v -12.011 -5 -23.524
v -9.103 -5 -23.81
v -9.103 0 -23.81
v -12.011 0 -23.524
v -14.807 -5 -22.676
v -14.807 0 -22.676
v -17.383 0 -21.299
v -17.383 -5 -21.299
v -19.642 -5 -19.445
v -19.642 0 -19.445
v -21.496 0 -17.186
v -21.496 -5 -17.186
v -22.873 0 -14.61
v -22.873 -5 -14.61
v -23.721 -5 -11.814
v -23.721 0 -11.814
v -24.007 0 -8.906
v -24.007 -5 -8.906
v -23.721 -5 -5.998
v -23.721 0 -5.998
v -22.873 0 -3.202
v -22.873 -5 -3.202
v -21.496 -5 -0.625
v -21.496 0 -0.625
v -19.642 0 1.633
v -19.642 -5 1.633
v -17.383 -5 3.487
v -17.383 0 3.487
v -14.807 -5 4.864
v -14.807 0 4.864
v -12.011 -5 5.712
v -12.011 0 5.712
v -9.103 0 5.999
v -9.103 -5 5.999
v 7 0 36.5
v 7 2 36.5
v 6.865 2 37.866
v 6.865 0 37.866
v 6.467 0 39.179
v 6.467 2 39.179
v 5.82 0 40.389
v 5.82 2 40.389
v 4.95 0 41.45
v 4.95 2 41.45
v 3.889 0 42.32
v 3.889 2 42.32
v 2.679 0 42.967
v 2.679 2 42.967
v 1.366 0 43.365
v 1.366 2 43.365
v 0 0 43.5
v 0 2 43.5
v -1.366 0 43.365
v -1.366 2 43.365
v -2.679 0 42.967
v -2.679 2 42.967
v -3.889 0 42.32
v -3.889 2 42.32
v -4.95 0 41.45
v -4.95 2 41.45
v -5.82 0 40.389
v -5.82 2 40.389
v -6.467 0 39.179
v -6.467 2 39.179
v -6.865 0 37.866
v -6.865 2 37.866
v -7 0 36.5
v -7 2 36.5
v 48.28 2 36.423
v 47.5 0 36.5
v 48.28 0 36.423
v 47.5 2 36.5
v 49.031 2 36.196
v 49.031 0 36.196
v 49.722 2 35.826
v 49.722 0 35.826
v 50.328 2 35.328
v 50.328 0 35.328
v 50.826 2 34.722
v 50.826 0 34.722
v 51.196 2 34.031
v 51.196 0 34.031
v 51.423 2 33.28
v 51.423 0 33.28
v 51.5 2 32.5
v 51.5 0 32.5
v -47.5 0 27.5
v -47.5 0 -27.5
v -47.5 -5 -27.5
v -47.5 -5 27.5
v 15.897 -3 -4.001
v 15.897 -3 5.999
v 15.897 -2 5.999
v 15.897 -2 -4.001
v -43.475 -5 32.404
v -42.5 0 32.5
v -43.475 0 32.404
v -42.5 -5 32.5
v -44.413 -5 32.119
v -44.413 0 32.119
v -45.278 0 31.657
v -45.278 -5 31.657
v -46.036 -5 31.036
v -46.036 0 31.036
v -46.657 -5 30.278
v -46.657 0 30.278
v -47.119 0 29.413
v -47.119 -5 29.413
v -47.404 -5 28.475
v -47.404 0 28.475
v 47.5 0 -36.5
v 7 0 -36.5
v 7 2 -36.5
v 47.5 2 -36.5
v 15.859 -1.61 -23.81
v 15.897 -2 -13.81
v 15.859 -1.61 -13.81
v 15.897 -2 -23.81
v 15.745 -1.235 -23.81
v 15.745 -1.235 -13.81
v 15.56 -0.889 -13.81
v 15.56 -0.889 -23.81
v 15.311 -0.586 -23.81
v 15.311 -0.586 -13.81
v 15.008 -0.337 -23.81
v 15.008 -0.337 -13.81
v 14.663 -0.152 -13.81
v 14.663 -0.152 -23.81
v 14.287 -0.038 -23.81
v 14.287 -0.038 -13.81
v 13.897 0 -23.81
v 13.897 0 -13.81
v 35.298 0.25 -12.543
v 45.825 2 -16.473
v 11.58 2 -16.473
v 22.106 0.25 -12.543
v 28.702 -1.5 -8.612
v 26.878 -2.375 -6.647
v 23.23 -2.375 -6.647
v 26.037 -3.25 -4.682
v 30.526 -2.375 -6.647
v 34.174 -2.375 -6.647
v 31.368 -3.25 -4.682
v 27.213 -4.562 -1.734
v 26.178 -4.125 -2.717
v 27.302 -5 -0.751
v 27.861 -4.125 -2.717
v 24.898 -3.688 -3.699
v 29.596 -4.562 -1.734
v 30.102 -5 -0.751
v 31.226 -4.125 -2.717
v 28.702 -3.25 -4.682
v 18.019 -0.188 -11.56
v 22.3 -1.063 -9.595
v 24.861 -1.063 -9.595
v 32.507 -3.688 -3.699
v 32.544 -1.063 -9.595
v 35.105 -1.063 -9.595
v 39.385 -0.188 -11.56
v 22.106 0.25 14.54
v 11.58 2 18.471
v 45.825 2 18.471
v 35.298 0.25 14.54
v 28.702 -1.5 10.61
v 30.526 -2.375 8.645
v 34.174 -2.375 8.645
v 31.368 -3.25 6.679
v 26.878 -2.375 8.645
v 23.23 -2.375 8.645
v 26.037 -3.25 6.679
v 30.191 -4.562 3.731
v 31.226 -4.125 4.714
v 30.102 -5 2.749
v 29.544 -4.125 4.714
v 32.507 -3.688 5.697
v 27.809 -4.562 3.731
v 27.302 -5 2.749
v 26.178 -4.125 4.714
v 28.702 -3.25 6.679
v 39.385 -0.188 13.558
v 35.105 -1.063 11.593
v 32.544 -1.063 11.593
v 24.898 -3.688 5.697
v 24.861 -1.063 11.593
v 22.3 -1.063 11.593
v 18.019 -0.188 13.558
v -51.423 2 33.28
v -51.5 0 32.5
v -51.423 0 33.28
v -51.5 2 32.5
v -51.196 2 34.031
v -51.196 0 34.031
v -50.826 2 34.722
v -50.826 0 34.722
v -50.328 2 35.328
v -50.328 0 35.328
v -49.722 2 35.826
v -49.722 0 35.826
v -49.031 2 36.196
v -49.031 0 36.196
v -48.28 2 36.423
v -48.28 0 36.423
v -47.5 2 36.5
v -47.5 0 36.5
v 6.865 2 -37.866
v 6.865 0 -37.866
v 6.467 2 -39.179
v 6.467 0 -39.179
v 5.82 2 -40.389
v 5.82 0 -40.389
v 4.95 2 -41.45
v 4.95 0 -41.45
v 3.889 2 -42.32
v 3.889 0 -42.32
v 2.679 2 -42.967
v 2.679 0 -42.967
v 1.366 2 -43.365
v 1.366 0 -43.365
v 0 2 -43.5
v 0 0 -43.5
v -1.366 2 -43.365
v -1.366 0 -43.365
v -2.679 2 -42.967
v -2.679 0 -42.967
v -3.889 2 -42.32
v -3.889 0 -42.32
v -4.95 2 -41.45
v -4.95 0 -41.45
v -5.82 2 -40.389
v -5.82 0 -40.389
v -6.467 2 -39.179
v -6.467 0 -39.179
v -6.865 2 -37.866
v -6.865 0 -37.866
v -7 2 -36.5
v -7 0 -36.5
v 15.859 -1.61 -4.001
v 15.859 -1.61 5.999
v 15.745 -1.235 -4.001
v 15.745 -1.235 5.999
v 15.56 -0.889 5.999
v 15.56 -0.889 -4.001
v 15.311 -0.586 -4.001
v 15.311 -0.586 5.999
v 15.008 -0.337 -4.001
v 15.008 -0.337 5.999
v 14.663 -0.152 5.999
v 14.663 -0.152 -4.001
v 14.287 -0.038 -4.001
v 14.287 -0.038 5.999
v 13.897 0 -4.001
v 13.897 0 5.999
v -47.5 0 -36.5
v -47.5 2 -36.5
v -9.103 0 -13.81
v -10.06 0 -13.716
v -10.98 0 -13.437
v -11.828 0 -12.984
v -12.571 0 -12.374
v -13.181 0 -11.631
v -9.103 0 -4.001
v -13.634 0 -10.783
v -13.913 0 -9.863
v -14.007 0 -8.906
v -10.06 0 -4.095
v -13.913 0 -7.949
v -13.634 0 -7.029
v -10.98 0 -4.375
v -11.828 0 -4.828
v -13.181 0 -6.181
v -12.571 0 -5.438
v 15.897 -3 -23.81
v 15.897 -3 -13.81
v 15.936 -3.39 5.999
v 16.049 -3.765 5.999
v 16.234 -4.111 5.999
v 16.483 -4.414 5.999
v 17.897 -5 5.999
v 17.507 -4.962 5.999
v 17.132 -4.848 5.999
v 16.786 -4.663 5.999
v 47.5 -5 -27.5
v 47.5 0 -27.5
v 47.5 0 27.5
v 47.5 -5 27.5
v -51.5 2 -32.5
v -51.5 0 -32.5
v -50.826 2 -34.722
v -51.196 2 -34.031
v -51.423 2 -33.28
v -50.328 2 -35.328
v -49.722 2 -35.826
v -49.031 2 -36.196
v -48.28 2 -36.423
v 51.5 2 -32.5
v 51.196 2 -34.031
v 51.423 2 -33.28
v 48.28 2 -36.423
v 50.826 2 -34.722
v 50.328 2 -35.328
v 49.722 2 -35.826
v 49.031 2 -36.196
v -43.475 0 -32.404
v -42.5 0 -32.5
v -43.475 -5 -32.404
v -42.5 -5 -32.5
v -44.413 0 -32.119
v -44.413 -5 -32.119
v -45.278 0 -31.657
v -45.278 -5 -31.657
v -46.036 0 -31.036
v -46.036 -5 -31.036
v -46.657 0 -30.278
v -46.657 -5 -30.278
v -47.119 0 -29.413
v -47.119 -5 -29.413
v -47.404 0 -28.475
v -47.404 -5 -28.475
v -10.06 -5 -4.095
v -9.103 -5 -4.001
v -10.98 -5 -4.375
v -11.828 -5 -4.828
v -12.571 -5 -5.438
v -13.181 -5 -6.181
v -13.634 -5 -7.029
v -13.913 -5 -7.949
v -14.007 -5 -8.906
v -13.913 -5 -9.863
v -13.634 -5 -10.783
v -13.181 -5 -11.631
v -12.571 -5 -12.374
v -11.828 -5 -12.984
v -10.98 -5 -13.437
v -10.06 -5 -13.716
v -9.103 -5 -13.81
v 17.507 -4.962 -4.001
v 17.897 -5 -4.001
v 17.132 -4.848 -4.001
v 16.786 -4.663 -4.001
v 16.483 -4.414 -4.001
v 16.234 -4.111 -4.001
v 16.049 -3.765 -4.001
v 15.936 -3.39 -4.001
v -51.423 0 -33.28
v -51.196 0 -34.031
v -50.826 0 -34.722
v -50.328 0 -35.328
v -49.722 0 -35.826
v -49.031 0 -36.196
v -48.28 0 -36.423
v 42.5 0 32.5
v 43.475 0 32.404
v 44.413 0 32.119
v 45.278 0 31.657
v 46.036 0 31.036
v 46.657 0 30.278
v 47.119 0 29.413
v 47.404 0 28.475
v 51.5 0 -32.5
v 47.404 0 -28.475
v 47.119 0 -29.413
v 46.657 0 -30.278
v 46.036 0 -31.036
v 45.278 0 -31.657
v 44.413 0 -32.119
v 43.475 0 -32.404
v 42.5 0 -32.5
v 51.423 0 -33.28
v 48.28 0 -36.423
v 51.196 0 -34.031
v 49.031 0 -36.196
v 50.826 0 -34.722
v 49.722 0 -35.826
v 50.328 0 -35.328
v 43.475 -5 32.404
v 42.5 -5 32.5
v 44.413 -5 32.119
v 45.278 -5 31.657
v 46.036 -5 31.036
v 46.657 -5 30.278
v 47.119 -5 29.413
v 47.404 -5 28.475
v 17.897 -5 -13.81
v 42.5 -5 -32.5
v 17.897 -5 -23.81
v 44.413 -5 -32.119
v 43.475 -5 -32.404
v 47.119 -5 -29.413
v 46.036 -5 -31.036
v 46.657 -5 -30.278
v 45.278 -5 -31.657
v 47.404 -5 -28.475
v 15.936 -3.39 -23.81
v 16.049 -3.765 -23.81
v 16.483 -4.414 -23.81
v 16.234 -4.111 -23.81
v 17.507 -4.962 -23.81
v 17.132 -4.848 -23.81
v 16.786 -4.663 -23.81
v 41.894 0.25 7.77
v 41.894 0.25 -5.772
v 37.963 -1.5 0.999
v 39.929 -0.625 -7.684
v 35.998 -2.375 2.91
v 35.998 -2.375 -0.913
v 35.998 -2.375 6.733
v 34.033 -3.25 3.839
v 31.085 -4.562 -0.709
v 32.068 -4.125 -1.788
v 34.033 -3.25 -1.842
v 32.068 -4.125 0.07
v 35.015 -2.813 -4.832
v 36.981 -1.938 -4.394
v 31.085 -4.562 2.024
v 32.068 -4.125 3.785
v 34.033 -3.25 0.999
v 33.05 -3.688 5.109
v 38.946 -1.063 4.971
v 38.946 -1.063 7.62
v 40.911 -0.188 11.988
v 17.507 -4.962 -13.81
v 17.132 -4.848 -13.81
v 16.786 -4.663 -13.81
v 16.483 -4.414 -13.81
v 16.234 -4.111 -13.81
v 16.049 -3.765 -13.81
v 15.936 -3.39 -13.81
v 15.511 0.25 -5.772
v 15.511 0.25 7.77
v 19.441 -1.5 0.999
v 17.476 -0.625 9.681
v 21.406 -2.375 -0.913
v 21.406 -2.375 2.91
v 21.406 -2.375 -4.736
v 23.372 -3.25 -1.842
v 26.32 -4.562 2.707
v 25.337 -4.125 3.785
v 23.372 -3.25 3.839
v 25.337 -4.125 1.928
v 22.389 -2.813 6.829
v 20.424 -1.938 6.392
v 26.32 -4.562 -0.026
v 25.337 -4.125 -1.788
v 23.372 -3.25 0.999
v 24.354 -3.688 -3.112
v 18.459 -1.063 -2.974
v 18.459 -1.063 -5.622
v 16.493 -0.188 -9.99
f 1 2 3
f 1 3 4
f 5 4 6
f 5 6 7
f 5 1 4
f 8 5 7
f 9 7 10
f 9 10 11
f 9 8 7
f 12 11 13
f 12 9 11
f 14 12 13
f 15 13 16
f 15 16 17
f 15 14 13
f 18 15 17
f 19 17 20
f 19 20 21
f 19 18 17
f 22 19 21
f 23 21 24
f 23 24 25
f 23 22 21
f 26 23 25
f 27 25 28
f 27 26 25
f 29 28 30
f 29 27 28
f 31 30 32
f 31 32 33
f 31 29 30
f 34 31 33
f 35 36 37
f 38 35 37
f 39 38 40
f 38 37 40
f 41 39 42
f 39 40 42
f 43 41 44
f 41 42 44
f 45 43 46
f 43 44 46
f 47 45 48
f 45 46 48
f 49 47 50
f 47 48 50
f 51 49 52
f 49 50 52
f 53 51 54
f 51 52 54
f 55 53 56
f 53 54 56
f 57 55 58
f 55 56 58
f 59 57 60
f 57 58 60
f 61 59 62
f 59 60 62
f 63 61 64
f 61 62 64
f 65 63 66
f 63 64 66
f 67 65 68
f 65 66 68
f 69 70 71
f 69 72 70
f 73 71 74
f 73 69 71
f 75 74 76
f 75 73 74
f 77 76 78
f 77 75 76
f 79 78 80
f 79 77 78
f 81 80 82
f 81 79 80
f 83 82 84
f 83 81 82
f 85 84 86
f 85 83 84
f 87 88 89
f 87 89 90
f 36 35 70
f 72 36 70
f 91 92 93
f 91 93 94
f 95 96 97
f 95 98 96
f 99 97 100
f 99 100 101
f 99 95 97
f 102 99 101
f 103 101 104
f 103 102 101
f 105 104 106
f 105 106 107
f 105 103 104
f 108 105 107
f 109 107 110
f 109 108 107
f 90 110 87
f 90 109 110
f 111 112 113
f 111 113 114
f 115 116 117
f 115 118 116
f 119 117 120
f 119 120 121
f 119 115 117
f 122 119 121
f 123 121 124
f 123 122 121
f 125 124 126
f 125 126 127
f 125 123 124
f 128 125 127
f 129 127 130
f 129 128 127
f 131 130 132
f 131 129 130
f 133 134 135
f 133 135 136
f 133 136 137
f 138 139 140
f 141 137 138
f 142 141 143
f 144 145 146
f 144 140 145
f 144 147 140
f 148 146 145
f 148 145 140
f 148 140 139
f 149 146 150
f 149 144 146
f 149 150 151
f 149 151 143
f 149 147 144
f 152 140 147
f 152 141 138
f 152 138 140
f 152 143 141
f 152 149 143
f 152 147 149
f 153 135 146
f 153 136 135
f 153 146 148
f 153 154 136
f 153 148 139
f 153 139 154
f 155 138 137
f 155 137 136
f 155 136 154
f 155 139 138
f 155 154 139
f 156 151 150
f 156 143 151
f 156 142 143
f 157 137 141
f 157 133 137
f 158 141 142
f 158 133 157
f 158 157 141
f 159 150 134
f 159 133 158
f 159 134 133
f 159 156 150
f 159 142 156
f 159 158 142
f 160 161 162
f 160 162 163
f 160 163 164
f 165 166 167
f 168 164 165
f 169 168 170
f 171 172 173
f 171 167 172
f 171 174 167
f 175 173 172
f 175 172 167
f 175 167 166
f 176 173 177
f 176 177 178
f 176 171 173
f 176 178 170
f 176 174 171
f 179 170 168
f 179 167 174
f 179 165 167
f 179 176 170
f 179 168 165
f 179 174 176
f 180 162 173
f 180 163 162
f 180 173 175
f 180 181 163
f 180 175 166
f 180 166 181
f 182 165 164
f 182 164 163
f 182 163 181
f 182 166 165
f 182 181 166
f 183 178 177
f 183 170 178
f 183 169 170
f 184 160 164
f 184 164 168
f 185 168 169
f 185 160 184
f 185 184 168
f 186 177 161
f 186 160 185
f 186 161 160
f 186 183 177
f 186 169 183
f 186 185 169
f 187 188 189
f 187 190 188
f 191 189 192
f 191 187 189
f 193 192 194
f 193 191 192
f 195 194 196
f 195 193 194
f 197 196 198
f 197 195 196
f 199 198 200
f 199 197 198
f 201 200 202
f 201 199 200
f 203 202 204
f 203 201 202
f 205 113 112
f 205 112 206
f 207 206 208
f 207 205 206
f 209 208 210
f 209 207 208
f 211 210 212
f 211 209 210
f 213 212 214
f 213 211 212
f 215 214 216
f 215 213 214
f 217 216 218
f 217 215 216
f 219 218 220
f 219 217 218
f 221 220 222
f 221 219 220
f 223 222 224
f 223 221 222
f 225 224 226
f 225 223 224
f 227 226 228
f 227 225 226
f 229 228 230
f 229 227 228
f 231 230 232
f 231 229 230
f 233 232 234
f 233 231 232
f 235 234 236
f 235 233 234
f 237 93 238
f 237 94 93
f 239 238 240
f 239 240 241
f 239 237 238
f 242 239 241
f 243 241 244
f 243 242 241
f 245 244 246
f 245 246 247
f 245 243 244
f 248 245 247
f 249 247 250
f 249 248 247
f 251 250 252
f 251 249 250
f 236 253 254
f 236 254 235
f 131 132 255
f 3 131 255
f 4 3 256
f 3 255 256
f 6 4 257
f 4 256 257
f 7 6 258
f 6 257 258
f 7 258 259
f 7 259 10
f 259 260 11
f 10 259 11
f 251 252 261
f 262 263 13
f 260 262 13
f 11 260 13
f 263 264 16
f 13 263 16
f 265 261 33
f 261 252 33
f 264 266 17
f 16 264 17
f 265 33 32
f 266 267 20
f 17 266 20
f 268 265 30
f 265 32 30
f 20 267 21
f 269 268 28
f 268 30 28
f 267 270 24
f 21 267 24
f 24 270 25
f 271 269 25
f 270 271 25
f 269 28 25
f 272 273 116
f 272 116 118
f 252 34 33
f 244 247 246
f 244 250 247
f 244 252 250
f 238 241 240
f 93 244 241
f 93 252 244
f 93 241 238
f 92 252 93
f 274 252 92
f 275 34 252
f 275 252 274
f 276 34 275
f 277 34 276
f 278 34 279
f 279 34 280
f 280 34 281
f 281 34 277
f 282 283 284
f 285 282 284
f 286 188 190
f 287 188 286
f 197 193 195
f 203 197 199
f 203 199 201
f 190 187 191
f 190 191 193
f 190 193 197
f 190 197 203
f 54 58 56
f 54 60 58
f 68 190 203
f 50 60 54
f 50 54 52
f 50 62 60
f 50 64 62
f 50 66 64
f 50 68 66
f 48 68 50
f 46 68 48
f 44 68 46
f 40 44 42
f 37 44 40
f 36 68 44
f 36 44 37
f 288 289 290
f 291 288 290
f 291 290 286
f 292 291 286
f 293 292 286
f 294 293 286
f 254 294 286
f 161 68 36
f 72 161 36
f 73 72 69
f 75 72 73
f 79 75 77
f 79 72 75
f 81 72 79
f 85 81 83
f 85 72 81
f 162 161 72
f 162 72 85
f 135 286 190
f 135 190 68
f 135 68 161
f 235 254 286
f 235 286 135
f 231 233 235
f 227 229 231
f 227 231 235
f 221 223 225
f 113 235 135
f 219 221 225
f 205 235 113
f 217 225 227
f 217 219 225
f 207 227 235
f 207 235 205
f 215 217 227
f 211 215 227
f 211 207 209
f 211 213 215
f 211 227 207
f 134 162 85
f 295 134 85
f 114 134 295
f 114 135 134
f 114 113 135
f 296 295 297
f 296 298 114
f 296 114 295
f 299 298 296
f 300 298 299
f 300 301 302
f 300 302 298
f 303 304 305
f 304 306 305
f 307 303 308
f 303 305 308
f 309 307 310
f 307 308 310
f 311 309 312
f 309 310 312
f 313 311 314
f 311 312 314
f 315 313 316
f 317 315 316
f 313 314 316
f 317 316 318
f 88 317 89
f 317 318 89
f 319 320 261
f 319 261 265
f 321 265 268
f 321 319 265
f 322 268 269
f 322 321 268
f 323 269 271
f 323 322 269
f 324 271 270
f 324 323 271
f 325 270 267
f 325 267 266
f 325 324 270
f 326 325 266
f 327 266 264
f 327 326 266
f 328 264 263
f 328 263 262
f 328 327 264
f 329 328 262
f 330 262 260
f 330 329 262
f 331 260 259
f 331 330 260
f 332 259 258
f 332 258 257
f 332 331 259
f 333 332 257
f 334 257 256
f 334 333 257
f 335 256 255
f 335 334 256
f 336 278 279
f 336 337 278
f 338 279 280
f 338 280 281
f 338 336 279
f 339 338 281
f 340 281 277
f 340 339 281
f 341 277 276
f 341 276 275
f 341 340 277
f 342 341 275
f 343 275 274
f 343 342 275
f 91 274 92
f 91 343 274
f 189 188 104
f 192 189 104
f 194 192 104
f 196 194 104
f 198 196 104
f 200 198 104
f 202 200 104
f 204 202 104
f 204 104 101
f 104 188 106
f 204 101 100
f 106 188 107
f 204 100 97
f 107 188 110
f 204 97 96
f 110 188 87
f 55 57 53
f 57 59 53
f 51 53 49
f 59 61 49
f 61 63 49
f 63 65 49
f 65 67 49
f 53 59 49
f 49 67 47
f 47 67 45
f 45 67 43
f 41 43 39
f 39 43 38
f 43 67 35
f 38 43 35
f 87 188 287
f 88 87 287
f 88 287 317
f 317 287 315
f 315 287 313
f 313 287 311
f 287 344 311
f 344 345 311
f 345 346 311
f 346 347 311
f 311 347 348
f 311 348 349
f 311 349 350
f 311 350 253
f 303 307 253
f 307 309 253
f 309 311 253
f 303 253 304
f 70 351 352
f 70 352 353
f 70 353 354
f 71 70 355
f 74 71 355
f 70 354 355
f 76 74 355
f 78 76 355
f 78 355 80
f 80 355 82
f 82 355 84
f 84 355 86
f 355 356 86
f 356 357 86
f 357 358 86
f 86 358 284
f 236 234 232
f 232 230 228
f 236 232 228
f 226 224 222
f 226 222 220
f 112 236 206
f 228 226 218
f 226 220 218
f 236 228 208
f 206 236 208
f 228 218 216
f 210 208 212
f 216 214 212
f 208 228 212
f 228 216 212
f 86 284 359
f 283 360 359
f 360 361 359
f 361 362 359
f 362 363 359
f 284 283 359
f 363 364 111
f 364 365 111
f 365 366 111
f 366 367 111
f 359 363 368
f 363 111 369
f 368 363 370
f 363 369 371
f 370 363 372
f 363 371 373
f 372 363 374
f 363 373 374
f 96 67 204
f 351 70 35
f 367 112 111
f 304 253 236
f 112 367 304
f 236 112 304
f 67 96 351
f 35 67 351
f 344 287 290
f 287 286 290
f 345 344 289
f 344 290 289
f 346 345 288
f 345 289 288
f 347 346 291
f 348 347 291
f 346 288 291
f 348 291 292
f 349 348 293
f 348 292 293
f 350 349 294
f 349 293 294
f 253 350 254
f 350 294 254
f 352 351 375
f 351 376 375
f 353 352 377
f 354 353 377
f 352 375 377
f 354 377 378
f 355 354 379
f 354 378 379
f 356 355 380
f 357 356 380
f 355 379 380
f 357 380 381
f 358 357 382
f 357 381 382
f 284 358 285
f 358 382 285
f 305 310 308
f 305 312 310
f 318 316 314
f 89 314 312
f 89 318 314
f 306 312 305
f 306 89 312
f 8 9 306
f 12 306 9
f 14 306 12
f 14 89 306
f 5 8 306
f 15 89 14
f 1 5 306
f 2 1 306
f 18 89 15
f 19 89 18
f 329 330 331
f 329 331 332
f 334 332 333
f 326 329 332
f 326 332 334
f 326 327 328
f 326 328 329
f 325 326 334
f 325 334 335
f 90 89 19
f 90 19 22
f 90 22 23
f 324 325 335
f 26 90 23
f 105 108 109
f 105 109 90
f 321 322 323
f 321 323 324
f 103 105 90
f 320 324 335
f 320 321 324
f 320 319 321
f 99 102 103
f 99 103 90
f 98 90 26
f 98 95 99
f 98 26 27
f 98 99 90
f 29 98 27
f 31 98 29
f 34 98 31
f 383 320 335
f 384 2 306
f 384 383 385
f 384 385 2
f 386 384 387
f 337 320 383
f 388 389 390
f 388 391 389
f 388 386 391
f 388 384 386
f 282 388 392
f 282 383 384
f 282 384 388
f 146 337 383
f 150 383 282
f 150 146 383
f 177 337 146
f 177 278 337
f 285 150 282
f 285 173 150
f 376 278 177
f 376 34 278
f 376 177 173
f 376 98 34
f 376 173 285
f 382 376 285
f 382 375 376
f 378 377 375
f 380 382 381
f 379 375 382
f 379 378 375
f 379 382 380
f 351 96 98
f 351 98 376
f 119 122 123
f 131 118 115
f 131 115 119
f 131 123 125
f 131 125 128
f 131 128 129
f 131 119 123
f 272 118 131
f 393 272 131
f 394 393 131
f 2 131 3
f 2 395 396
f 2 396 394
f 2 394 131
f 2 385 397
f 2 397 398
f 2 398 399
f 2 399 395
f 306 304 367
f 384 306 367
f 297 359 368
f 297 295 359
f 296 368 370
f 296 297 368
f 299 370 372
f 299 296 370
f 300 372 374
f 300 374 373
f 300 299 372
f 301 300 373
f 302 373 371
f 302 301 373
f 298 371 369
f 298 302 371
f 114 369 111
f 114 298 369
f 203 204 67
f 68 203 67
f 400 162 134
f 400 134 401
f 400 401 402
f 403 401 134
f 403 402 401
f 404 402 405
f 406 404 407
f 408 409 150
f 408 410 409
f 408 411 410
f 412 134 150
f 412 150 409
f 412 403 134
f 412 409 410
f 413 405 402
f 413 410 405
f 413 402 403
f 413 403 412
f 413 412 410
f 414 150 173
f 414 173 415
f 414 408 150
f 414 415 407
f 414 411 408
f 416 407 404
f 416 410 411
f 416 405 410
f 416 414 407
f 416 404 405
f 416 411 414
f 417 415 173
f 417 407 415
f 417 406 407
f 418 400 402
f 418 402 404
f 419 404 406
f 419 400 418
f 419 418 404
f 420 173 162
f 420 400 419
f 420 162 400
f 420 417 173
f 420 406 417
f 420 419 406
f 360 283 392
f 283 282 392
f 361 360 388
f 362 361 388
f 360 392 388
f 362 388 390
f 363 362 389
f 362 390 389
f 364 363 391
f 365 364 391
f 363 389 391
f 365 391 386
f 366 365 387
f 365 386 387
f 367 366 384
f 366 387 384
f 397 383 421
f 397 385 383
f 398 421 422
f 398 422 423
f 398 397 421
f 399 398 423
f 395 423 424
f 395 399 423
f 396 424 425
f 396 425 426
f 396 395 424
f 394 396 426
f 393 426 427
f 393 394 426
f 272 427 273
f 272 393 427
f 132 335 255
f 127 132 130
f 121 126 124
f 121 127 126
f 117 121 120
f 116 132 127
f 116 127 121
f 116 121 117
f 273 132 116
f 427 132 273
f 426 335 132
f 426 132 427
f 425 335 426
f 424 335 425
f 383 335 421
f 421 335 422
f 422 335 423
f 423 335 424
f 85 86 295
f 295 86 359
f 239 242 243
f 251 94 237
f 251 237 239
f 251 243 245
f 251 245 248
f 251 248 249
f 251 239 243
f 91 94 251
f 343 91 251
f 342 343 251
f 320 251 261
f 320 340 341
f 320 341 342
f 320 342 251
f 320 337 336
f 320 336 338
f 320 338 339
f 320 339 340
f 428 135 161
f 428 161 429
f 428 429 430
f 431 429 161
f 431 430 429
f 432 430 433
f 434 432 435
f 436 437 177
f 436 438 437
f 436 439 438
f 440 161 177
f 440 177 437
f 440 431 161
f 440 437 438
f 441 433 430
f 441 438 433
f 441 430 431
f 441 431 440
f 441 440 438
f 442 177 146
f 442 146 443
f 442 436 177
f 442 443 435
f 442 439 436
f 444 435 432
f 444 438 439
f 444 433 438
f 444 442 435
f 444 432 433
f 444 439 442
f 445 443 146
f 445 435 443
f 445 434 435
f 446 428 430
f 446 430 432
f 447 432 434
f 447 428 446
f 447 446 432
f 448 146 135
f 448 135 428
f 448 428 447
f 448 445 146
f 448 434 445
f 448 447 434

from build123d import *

# Parameters (mm, degrees)
SKETCH1_W           = 103
SKETCH1_H           = 73
BOSS_EXTRUDE1_DEPTH = 2
SKETCH2_W           = 95
SKETCH2_H           = 65
BOSS_EXTRUDE2_DEPTH = 5
BOSS_EXTRUDE3_DEPTH = 2
SKETCH12_W          = 2.8
SKETCH12_H          = 3.5
CUT_EXTRUDE3_DEPTH  = 7
CUT_EXTRUDE3_TAPER  = -66
FILLET4_R           = 4
CUT_EXTRUDE5_DEPTH  = 5
FILLET5_R           = 2
FILLET6_R           = 5


with BuildPart() as part:
    # Sketch1 → Boss-Extrude1 (new body)
    with BuildSketch(Plane(origin=(0, 0, 0), x_dir=(1, 0, 0), z_dir=(0, 1, 0))):
        Rectangle(SKETCH1_W, SKETCH1_H)
    extrude(amount=BOSS_EXTRUDE1_DEPTH)

    # Sketch2 → Boss-Extrude2 (add)
    with BuildSketch(Plane.XZ):
        Rectangle(SKETCH2_W, SKETCH2_H)
    extrude(amount=BOSS_EXTRUDE2_DEPTH)

    # Sketch3 → Boss-Extrude3 (add)
    with BuildSketch(Plane(origin=(0, 2, 0), x_dir=(1, 0, 0), z_dir=(0, 1, 0))):
        with BuildLine():
            Line((-7, -36.5), (7, -36.5))
            ThreePointArc((7, -36.5), (0, -43.5), (-7, -36.5))
        make_face()
    boss_extrude3 = extrude(amount=-BOSS_EXTRUDE3_DEPTH)

    # Mirror1: Boss-Extrude3 across plane
    add(boss_extrude3.mirror(Plane.XY))

    # Sketch12 → Cut-Extrude3 (cut)
    with BuildSketch(Plane.XZ.offset(5)):
        with Locations((28.702273545, 0.998760933)):
            Rectangle(SKETCH12_W, SKETCH12_H)
    extrude(amount=-CUT_EXTRUDE3_DEPTH, taper=CUT_EXTRUDE3_TAPER, mode=Mode.SUBTRACT)

    # Fillet4
    fillet4_edges = [part.edges().sort_by_distance(p)[0] for p in [
        (51.5, 1, 36.5),
        (-51.5, 1, 36.5),
        (-51.5, 1, -36.5),
        (51.5, 1, -36.5),
    ]]
    fillet(fillet4_edges, radius=FILLET4_R)

    # Sketch13 → Cut-Extrude5 (cut)
    with BuildSketch(Plane.XZ.offset(5)):
        with BuildLine():
            ThreePointArc((-9.102862796, -4.001239067), (-14.007432374, -8.905808645), (-9.102862796, -13.810378223))
            Line((-9.102862796, -13.810378223), (15.897137204, -13.810378223))
            Line((15.897137204, -13.810378223), (15.897137204, -23.810378223))
            Line((15.897137204, -23.810378223), (-9.102862796, -23.810378223))
            ThreePointArc((-9.102862796, -23.810378223), (-24.007432374, -8.905808645), (-9.102862796, 5.998760933))
            Line((-9.102862796, 5.998760933), (10.507409885, 5.998760933))
            Line((10.507409885, 5.998760933), (15.897137204, 5.998760933))
            Line((15.897137204, 5.998760933), (15.897137204, -4.001239067))
            Line((15.897137204, -4.001239067), (14.523166563, -4.001239067))
            Line((14.523166563, -4.001239067), (-9.102862796, -4.001239067))
        make_face()
    extrude(amount=-CUT_EXTRUDE5_DEPTH, mode=Mode.SUBTRACT)

    # Fillet5
    fillet5_edges = [part.edges().sort_by_distance(p)[0] for p in [
        (15.897137204, 0, -18.810378223),
        (15.897137204, 0, 0.998760933),
        (15.897137204, -5, -18.810378223),
        (15.897137204, -5, 0.998760933),
    ]]
    fillet(fillet5_edges, radius=FILLET5_R)

    # Fillet6
    fillet6_edges = [part.edges().sort_by_distance(p)[0] for p in [
        (-47.5, -2.5, -32.5),
        (47.5, -2.5, -32.5),
        (47.5, -2.5, 32.5),
        (-47.5, -2.5, 32.5),
    ]]
    fillet(fillet6_edges, radius=FILLET6_R)


solid = part.part
